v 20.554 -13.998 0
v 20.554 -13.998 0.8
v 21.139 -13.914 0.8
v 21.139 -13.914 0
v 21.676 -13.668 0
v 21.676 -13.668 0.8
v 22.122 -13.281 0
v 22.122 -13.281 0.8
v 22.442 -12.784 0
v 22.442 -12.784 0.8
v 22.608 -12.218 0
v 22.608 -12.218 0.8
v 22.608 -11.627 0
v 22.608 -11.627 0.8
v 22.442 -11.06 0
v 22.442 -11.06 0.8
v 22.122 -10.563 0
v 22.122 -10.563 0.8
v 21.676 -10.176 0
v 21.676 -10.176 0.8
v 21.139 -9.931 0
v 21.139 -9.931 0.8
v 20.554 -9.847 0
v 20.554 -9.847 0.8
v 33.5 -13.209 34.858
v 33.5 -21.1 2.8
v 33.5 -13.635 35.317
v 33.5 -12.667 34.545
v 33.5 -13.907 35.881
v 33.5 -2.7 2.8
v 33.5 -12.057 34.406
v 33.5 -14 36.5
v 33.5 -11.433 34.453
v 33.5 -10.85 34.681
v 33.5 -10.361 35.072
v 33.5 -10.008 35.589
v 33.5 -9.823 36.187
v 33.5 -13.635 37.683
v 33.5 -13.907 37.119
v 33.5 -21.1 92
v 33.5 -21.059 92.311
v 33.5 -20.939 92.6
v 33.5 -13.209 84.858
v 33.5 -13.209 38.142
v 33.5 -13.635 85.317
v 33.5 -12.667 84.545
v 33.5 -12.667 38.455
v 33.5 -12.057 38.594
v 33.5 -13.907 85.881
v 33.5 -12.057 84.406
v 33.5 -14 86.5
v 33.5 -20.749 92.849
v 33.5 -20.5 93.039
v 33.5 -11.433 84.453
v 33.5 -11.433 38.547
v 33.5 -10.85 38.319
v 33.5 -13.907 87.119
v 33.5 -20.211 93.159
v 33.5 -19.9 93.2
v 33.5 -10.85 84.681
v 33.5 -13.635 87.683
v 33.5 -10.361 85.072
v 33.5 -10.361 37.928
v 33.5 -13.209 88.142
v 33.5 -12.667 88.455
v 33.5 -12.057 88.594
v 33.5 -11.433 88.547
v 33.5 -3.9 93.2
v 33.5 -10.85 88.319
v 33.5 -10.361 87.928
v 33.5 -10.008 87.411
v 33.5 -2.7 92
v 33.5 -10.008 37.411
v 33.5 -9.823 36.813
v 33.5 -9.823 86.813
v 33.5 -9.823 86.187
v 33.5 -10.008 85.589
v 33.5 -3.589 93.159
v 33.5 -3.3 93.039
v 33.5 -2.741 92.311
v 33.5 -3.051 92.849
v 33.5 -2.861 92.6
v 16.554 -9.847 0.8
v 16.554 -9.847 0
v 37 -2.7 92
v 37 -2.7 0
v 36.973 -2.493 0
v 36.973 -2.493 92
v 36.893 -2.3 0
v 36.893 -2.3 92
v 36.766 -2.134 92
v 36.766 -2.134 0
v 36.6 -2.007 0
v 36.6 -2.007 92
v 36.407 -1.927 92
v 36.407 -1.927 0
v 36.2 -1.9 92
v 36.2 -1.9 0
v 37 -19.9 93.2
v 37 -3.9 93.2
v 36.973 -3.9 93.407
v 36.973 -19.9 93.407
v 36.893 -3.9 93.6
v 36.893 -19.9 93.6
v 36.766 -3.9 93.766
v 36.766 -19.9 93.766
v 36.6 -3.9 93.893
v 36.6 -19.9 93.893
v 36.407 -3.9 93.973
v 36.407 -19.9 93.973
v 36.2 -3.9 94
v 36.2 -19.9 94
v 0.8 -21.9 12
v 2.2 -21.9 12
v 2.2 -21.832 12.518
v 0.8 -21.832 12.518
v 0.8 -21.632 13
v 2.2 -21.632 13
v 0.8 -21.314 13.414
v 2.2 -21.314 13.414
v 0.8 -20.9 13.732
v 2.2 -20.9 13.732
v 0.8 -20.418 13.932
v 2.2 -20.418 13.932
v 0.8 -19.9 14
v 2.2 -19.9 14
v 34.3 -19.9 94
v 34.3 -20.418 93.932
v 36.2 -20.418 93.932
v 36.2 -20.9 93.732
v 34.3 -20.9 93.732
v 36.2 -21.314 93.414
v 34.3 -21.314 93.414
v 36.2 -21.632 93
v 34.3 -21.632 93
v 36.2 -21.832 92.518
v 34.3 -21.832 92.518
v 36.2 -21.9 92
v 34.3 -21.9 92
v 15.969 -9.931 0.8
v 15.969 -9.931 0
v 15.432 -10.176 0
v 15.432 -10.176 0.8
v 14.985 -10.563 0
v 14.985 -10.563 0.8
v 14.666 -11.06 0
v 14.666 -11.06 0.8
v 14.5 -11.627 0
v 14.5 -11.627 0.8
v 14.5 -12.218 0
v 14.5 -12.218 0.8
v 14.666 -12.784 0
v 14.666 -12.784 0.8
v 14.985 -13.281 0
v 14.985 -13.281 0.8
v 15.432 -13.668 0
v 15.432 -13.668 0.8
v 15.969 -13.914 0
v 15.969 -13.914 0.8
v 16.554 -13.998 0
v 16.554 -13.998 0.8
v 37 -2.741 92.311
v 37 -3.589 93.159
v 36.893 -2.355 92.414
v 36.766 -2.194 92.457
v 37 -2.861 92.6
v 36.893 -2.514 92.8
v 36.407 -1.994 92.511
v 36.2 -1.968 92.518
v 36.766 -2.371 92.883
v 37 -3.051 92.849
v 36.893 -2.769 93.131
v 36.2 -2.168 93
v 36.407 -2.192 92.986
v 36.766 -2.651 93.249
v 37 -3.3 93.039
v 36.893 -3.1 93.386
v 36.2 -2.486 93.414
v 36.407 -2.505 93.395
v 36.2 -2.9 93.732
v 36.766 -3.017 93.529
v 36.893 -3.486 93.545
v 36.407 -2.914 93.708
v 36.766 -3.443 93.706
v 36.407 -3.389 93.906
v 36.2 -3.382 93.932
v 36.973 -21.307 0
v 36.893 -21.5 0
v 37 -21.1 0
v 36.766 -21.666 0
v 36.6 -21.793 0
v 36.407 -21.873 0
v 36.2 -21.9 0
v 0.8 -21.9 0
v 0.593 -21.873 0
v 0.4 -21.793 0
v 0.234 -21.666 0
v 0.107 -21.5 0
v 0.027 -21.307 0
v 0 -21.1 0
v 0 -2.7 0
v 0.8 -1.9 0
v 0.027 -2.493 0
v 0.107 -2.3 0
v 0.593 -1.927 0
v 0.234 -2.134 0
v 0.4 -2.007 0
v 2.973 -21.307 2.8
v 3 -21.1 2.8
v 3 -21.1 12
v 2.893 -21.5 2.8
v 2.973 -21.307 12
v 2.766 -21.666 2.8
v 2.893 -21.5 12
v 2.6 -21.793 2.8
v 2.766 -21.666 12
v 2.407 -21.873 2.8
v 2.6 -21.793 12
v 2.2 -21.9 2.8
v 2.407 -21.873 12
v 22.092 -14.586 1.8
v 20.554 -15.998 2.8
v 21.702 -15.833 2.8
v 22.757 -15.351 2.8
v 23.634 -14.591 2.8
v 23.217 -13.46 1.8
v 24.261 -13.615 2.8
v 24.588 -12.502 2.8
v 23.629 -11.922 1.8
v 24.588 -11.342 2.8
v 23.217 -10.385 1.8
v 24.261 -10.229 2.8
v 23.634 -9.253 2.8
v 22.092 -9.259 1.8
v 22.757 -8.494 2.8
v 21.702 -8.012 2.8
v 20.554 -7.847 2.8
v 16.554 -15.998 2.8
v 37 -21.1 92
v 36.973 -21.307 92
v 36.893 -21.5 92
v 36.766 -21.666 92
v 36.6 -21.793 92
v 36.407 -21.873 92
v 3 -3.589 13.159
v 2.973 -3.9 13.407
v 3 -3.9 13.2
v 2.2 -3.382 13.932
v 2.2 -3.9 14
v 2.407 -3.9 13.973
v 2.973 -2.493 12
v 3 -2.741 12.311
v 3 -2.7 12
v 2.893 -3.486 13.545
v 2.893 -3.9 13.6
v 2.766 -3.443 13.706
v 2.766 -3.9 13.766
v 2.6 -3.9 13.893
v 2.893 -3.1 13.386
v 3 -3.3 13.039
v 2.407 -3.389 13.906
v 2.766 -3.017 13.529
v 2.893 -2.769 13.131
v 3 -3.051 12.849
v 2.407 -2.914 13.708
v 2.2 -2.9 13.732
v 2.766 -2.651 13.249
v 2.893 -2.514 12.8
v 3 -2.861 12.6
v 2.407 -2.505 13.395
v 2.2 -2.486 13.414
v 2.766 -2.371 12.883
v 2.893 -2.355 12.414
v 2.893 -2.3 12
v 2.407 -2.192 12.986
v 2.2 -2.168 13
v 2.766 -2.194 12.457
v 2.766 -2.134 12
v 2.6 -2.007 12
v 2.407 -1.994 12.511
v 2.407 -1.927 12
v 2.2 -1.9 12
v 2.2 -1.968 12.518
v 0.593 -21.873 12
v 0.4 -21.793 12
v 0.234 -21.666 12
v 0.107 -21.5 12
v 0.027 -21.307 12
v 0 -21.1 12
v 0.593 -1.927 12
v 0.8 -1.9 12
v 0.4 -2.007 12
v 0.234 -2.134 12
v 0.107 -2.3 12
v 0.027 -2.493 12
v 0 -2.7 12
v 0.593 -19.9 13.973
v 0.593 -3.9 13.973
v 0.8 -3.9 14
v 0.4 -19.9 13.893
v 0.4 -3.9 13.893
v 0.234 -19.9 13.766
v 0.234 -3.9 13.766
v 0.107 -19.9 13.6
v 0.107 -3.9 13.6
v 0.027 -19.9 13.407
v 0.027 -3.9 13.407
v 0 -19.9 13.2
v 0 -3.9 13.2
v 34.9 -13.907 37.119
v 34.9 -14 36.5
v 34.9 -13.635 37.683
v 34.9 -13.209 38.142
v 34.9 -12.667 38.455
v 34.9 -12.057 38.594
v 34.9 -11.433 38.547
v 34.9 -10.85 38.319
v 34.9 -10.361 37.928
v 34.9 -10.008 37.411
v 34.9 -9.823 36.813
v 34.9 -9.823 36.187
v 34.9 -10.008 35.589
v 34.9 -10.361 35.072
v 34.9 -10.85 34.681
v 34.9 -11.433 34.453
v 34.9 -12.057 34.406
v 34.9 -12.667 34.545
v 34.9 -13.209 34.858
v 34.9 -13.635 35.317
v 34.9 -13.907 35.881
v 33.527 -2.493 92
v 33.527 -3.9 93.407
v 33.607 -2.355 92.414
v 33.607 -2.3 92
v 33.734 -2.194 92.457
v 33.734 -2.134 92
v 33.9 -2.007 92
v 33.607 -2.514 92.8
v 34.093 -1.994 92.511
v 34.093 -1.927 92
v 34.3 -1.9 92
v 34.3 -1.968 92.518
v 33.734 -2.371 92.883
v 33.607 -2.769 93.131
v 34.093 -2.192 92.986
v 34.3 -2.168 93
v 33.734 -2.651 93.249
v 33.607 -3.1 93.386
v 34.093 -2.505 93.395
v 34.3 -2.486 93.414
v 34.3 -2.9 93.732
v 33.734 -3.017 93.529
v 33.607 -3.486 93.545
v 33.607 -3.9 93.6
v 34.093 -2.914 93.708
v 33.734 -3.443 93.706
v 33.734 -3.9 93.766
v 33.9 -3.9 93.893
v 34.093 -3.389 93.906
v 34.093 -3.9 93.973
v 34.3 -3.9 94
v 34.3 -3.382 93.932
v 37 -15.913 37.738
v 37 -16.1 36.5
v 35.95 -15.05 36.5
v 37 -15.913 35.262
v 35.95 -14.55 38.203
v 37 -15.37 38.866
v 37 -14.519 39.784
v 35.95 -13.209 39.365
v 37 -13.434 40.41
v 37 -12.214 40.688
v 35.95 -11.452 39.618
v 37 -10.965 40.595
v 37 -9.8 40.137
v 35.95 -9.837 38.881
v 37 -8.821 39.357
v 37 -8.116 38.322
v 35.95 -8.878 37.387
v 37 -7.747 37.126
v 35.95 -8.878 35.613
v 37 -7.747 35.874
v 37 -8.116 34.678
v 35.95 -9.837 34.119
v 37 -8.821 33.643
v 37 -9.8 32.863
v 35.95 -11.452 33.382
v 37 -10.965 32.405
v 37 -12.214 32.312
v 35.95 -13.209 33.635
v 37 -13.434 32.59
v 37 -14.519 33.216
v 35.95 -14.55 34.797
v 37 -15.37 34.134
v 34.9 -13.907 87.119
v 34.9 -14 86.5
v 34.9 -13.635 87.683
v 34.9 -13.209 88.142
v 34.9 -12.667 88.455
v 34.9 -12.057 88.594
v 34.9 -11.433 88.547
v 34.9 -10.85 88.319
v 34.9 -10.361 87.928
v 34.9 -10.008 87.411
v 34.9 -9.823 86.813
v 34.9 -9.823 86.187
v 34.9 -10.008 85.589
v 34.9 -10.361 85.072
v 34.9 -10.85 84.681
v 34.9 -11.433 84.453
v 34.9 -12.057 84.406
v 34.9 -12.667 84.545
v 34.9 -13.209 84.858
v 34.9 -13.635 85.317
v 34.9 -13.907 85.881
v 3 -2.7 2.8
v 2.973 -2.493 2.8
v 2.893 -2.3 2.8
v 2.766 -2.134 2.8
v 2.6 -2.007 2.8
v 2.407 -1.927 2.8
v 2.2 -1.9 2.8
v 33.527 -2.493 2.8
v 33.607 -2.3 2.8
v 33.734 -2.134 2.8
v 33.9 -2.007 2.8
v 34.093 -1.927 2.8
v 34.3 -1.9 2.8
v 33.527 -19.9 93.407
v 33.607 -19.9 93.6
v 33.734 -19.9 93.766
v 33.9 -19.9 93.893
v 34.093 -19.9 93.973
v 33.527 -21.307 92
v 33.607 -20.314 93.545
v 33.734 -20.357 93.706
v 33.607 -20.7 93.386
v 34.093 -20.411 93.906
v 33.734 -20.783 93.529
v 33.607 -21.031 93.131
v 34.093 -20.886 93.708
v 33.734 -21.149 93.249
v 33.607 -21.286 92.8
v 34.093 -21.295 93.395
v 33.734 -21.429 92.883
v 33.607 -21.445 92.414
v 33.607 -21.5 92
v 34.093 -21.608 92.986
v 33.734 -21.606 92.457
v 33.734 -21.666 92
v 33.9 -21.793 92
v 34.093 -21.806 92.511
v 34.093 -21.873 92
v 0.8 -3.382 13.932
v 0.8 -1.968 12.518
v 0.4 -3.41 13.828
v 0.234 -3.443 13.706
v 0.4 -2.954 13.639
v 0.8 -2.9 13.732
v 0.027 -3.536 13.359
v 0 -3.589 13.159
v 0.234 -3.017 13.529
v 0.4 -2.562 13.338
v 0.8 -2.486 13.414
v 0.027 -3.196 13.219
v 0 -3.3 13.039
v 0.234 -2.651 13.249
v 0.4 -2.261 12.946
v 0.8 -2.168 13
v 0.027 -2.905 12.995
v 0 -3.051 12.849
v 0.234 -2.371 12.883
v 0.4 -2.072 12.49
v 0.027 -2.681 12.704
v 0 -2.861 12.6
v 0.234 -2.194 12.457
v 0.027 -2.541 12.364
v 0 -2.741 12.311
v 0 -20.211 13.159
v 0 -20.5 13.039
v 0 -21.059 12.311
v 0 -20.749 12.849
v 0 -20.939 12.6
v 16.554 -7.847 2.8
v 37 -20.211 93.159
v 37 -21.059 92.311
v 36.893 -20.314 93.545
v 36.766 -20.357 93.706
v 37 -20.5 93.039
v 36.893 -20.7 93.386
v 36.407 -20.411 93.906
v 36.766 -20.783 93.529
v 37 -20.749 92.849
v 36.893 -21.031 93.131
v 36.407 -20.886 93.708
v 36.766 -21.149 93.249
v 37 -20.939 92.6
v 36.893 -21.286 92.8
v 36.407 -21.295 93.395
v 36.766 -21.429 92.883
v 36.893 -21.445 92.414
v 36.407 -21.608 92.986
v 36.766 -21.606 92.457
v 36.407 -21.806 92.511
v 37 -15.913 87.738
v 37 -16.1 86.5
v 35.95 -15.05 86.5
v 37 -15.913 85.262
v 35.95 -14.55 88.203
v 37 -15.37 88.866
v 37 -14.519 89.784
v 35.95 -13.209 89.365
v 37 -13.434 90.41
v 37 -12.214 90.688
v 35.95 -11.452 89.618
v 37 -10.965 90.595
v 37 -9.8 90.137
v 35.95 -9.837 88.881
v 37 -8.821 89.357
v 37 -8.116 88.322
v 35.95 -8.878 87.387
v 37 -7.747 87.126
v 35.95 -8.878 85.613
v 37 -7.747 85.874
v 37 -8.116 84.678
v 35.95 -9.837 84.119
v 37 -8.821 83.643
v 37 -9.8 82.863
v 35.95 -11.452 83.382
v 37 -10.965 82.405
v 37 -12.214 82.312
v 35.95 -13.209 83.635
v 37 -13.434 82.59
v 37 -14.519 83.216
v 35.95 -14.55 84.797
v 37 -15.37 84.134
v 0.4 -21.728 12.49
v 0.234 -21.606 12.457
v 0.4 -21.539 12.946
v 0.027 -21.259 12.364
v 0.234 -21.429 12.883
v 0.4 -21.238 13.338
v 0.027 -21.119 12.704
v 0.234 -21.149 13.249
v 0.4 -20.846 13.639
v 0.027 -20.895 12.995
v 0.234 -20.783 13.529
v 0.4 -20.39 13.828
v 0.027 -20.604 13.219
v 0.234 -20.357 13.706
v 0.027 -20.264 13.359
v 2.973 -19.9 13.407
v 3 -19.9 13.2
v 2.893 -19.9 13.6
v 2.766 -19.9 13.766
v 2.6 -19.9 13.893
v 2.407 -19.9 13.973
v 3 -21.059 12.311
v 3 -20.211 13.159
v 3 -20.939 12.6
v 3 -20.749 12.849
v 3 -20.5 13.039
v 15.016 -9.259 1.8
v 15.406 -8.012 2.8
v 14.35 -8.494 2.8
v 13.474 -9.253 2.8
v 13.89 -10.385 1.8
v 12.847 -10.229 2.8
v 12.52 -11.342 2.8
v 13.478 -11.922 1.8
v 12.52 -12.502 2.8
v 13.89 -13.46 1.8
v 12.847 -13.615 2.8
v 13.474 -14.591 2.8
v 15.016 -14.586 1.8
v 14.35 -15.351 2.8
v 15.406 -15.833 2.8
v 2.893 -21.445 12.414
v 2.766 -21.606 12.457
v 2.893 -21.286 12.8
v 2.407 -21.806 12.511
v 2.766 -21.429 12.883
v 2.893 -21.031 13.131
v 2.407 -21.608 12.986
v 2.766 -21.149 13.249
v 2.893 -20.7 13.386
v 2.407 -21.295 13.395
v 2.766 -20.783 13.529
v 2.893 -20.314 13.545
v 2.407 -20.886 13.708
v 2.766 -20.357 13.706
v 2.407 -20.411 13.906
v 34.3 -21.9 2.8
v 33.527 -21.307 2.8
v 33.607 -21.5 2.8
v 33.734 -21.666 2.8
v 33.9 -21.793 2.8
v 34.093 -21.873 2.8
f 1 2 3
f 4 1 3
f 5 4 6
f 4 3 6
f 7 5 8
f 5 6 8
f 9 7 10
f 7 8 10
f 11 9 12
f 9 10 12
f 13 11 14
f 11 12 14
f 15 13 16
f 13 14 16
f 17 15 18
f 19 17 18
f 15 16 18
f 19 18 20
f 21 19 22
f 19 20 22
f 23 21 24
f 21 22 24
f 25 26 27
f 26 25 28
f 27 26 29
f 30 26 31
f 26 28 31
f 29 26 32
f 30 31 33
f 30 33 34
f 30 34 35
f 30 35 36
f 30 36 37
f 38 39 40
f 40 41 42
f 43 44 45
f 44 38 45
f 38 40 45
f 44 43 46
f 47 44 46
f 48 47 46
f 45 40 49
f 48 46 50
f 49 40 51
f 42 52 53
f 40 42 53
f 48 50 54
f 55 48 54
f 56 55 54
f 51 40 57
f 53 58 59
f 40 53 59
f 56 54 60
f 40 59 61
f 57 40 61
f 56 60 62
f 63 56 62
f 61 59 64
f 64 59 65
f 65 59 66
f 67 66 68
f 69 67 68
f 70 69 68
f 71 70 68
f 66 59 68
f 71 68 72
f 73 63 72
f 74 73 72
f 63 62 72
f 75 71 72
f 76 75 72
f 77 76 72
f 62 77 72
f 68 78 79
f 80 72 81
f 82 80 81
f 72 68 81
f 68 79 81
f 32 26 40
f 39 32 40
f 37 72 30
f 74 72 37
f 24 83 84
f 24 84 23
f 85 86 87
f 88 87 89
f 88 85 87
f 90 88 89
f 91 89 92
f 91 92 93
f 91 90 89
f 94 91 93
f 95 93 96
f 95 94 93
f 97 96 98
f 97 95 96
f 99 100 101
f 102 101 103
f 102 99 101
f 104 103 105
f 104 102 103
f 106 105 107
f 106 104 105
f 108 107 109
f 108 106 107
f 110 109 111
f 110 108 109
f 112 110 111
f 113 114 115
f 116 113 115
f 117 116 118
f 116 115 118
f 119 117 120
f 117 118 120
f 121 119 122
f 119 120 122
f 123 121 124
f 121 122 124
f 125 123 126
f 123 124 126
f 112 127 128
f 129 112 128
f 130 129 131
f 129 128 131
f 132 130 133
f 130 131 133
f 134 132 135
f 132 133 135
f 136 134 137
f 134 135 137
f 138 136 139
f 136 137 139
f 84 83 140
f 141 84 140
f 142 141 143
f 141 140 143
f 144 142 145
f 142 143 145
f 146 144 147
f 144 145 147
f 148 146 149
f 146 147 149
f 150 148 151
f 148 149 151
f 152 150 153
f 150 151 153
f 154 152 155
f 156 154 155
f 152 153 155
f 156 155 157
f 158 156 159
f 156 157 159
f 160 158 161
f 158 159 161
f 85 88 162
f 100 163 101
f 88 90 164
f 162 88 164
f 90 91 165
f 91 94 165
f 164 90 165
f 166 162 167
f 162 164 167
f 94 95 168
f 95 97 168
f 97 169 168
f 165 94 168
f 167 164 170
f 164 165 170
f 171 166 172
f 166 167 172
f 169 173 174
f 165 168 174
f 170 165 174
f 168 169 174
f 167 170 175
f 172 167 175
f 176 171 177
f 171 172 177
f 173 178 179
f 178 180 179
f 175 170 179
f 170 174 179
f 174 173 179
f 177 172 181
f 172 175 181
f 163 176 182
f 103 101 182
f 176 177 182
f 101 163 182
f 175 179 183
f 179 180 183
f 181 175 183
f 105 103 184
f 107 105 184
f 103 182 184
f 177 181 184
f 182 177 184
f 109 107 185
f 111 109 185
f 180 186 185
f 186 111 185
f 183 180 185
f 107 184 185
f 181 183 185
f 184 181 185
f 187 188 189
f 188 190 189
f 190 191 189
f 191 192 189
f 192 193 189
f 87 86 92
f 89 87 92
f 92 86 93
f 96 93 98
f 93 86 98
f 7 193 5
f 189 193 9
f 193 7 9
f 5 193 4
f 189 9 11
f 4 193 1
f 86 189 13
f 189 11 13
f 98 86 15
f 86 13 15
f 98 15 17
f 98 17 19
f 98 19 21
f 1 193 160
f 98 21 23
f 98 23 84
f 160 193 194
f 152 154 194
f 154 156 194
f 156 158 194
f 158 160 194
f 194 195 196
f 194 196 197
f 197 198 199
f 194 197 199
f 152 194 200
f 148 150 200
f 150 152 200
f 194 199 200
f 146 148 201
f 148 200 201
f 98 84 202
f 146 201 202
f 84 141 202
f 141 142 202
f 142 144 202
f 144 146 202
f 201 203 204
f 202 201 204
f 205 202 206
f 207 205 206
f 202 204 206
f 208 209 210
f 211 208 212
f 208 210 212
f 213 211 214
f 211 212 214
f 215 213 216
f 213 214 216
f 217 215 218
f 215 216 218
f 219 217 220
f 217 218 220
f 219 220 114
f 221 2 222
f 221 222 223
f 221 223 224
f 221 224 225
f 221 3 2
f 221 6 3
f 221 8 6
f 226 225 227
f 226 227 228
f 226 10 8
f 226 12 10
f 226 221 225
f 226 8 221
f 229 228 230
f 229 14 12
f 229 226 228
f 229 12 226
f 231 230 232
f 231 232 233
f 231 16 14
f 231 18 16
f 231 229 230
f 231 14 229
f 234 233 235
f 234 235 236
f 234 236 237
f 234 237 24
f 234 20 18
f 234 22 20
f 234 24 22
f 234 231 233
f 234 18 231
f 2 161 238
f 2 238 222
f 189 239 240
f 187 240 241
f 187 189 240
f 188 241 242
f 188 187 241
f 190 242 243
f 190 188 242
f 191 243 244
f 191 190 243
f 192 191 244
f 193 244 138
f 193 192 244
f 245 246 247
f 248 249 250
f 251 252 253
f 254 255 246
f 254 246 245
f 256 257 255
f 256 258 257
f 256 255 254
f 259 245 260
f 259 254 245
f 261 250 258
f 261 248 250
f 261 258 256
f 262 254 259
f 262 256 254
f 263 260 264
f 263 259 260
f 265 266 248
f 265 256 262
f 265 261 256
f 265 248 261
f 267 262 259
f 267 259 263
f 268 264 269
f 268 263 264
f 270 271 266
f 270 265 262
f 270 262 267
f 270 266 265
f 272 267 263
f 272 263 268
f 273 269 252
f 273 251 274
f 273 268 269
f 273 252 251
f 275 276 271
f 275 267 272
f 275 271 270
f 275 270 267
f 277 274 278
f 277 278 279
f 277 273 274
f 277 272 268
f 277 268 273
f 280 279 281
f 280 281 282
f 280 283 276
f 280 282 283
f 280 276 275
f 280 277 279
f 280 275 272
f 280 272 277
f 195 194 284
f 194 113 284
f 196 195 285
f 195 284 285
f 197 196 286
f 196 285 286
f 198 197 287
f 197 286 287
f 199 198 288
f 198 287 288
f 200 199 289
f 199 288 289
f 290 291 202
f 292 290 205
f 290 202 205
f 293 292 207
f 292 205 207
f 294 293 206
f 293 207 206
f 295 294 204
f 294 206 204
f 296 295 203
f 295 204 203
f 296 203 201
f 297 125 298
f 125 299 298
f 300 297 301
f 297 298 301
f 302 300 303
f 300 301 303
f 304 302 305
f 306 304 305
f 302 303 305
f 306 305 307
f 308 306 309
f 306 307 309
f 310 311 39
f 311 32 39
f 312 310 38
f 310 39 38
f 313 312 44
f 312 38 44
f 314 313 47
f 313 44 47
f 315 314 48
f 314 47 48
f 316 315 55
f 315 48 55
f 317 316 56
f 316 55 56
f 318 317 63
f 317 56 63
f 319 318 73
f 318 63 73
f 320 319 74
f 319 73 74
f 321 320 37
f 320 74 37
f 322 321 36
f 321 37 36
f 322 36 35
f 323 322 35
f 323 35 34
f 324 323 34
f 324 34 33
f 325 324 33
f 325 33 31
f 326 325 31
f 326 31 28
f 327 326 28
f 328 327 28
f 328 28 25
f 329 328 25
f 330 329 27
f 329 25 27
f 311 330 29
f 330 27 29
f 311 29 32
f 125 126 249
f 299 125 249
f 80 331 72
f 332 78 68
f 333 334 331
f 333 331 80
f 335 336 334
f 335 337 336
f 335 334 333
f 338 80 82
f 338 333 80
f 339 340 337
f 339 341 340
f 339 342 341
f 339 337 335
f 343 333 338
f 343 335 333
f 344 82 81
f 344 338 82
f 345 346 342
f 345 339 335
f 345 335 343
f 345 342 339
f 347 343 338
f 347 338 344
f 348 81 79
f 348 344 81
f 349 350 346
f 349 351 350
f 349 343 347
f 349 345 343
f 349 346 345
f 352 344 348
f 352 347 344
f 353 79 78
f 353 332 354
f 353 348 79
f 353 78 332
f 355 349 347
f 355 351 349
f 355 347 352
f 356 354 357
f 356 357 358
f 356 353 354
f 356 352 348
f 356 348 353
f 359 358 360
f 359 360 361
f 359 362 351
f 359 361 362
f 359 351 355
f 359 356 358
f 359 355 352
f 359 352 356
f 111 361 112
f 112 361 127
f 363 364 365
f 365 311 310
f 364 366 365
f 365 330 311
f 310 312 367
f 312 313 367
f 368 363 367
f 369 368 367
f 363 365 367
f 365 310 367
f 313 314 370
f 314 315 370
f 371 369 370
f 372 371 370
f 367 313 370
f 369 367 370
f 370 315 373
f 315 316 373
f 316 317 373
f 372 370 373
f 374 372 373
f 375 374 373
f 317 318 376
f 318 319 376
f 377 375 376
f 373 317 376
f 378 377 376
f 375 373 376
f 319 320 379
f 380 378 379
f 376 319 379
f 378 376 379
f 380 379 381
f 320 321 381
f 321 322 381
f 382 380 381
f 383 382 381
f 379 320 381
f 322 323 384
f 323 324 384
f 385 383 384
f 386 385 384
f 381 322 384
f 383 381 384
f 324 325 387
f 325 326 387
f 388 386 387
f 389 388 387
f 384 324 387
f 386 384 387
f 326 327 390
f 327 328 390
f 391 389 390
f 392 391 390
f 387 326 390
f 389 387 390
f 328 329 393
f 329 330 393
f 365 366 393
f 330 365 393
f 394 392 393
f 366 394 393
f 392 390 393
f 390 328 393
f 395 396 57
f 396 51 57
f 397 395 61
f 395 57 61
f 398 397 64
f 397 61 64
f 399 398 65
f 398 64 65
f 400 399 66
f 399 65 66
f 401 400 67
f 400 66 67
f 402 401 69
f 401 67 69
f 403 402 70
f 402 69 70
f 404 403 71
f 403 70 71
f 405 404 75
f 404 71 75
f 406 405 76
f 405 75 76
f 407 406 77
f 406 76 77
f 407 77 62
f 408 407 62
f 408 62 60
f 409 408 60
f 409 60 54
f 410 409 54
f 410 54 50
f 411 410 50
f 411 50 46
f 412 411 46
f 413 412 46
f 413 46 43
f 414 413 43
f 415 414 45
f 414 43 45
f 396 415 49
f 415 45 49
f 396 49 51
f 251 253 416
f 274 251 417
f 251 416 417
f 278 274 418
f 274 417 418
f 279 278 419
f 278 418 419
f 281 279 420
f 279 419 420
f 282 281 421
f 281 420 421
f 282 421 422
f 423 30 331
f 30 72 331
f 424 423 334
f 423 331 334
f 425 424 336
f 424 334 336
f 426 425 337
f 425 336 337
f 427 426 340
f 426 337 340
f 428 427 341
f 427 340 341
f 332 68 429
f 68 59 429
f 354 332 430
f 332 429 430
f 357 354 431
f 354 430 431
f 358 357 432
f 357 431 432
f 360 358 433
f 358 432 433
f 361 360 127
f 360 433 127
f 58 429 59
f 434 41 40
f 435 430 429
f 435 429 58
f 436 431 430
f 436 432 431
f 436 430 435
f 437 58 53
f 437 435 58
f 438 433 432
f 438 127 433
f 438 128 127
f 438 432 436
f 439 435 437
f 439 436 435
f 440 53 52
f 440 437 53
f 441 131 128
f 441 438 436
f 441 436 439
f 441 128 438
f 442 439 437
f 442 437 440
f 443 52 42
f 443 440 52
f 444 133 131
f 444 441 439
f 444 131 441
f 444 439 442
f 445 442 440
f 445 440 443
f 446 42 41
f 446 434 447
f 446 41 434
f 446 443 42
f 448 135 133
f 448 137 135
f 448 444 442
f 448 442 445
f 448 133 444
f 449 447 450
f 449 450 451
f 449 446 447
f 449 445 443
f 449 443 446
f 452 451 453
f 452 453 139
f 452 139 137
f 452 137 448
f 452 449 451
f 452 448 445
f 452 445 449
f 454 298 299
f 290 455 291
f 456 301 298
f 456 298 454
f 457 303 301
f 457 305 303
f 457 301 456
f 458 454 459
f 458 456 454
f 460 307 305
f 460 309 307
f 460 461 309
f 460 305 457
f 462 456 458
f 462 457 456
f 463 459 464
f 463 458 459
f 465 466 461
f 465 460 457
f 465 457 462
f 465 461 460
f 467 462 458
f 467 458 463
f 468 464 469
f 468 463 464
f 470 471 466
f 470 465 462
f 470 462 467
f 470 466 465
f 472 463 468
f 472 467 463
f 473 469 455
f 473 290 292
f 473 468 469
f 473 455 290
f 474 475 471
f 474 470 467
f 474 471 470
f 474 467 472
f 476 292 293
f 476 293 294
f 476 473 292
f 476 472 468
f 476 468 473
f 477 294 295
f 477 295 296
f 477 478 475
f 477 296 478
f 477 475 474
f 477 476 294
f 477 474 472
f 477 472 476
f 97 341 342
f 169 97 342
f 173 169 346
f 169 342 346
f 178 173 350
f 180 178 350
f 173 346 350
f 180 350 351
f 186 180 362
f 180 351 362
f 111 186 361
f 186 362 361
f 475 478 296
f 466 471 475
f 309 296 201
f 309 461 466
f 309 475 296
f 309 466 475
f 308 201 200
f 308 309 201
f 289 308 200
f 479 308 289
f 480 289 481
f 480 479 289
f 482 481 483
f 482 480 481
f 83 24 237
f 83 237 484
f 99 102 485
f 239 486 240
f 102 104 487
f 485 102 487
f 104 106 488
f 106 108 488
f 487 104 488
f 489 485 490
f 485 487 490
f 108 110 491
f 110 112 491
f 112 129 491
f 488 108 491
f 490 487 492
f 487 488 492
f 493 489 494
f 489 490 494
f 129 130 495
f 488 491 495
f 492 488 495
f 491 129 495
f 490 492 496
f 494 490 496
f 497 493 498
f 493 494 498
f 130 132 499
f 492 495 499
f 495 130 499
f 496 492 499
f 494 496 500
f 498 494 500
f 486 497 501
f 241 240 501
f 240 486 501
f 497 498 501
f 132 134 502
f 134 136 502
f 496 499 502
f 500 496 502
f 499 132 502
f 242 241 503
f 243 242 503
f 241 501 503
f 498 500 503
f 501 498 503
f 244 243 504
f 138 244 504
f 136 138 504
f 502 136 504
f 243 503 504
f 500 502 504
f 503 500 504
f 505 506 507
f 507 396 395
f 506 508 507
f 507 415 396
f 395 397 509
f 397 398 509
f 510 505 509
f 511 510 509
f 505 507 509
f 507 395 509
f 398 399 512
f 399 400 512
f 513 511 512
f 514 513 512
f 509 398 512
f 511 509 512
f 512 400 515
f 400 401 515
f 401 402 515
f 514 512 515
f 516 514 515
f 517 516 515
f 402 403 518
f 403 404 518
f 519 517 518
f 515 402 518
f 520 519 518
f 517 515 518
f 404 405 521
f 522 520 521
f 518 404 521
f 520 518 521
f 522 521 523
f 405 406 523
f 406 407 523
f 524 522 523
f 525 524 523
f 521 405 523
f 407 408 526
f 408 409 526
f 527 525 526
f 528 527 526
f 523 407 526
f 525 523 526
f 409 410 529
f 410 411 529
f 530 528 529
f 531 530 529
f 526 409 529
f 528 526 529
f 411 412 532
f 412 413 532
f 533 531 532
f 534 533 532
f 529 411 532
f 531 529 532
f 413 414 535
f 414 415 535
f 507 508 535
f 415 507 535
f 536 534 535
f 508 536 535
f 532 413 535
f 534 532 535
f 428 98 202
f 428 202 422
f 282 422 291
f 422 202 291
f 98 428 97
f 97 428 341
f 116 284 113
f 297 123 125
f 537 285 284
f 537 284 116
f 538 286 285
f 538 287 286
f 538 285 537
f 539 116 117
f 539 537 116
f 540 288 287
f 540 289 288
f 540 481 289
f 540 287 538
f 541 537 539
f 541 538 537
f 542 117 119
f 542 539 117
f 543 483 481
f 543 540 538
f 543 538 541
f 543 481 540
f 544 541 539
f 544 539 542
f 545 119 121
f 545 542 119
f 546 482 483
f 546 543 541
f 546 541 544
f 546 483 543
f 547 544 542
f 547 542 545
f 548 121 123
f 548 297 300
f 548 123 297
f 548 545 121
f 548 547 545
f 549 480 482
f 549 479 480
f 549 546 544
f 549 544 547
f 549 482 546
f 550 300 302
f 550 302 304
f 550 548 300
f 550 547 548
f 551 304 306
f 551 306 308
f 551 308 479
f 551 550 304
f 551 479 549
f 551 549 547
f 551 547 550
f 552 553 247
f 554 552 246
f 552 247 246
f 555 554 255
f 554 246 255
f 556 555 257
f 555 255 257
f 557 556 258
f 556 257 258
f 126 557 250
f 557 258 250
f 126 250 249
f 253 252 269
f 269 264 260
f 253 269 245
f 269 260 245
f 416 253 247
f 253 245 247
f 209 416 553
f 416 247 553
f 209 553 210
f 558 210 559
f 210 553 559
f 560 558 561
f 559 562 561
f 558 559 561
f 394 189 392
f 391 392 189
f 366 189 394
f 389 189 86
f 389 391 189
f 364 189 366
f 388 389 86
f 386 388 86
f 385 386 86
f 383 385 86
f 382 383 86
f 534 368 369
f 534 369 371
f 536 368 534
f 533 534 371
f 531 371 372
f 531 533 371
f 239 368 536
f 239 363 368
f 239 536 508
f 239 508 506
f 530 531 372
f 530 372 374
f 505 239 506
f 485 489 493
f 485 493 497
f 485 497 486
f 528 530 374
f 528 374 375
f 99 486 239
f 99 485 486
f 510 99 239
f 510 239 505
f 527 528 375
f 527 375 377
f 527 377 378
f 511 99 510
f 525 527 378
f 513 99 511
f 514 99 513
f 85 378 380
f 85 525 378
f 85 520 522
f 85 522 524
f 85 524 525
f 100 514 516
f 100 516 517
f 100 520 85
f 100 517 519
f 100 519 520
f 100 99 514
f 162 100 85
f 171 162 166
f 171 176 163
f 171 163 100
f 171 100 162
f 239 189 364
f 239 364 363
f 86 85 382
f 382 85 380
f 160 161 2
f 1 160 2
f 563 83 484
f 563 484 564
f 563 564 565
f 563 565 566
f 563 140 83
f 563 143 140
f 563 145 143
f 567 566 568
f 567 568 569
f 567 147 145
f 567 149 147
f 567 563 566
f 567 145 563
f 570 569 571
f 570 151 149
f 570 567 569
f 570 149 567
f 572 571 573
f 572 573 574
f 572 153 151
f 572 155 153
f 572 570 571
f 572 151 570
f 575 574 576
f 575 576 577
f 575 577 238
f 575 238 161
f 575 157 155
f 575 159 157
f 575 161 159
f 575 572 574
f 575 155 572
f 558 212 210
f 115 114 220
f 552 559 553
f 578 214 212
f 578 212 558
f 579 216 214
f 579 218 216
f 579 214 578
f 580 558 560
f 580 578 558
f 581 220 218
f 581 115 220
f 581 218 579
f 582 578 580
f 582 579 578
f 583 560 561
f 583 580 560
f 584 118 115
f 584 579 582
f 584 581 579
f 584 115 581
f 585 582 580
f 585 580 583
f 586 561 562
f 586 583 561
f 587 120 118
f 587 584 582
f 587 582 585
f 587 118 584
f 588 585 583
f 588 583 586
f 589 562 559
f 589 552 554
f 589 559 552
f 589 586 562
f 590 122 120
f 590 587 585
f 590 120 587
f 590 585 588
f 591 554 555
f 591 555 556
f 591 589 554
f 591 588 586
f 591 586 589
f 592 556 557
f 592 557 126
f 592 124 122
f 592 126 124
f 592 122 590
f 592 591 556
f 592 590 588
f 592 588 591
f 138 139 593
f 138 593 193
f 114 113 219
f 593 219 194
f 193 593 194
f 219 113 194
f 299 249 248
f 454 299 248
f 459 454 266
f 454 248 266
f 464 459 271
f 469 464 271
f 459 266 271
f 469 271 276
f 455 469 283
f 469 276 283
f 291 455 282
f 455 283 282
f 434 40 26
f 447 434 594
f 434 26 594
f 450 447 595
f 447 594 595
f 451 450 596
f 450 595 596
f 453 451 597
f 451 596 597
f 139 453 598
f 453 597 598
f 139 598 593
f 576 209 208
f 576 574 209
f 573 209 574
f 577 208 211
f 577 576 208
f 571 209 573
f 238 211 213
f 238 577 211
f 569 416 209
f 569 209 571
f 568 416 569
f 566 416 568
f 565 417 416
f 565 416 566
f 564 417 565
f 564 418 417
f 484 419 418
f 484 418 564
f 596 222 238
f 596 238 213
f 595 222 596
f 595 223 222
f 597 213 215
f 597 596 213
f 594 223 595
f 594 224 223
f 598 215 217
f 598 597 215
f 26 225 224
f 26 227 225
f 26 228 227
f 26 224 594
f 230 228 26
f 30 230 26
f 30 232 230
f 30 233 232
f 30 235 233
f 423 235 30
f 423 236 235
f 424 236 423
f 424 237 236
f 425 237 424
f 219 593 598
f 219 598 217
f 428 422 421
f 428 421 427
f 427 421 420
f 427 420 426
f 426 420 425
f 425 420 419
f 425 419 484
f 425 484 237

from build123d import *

# Parameters (mm, degrees)
SKETCH018_W         = 30.5
SKETCH018_H         = 20
PAD010_DEPTH        = 2.8
PAD011_DEPTH        = 3
PAD012_DEPTH        = 3.5
HOLE005_D           = 4.2
HOLE005_DEPTH       = 25
HOLE005_CSINK_D     = 8.4
HOLE005_CSINK_ANGLE = 90
HOLE005_TIPS_R      = 2.1
POCKET003_DEPTH     = 2.801
CHAMFER001_SIZE     = 2
FILLET001_R         = 0.8


with BuildPart() as part:
    # Sketch018 → Pad010 (new body)
    with BuildSketch(Plane.XY):
        with Locations((18.25, 10)):
            Rectangle(SKETCH018_W, SKETCH018_H)
    extrude(amount=PAD010_DEPTH)

    # Sketch019 (on Face4 of Pad010) → Pad011 (join)
    with BuildSketch(Plane(origin=(3, 0, 0), x_dir=(0, -1, 0), z_dir=(-1, 0, 0))):
        with BuildLine():
            Line((-20, 0), (0, 0))
            Line((0, 0), (0, 12))
            ThreePointArc((0, 12), (-0.585786, 13.414214), (-2, 14))
            Line((-2, 14), (-18, 14))
            ThreePointArc((-18, 14), (-19.414214, 13.414214), (-20, 12))
            Line((-20, 12), (-20, 0))
        make_face()
    extrude(amount=PAD011_DEPTH)

    # Sketch020 (on Face1 of Pad011) → Pad012 (join)
    with BuildSketch(Plane.YZ.offset(33.5)):
        with BuildLine():
            Line((20, 0), (20, 92))
            ThreePointArc((20, 92), (19.414214, 93.414214), (18, 94))
            Line((18, 94), (2, 94))
            ThreePointArc((2, 94), (0.585786, 93.414214), (0, 92))
            Line((0, 92), (0, 0))
            Line((0, 0), (20, 0))
        make_face()
    extrude(amount=PAD012_DEPTH)

    # Hole005
    with Locations(Plane.YZ.offset(37)):
        with Locations((10, 36.5), (10, 86.5)):
            CounterSinkHole(HOLE005_D / 2, HOLE005_CSINK_D / 2, depth=HOLE005_DEPTH, counter_sink_angle=HOLE005_CSINK_ANGLE)

    # Hole005 tips → Hole005 tip 1 section 0
    with BuildSketch(Plane.YZ.offset(12), mode=Mode.PRIVATE) as hole005_tip_1_s0:
        with Locations((10, 36.5)):
            Circle(HOLE005_TIPS_R)
    loft([hole005_tip_1_s0.sketch, Vertex(10.738193, 10, 36.5)], mode=Mode.SUBTRACT)

    # Hole005 tips → Hole005 tip 2 section 0
    with BuildSketch(Plane.YZ.offset(12), mode=Mode.PRIVATE) as hole005_tip_2_s0:
        with Locations((10, 86.5)):
            Circle(HOLE005_TIPS_R)
    loft([hole005_tip_2_s0.sketch, Vertex(10.738193, 10, 86.5)], mode=Mode.SUBTRACT)

    # Sketch022 (on Face1 of Hole005) → Pocket003 (cut, through all)
    with BuildSketch(Plane.XY.offset(2.8)):
        with BuildLine():
            ThreePointArc((16.553834, 12.053193), (14.478422, 9.977781), (16.553834, 7.902369))
            Line((16.553834, 7.902369), (20.553834, 7.902369))
            ThreePointArc((20.553834, 7.902369), (22.629246, 9.977781), (20.553834, 12.053193))
            Line((16.553834, 12.053193), (20.553834, 12.053193))
        make_face()
    extrude(amount=-POCKET003_DEPTH, mode=Mode.SUBTRACT)

    # Chamfer001
    chamfer001_edges = [part.edges().sort_by_distance(p)[0] for p in [
        (18.553834, 7.902369, 2.8),
    ]]
    chamfer(chamfer001_edges, length=CHAMFER001_SIZE)

    # Fillet001
    fillet001_edges = [part.edges().sort_by_distance(p)[0] for p in [
        (0, 10, 14),
        (3, 10, 14),
        (33.5, 10, 94),
        (37, 10, 94),
    ]]
    fillet(fillet001_edges, radius=FILLET001_R)


with BuildPart() as part_1:
    # Body004 placement: moved
    add(part.part.moved(Location((0, -21.9, 0))))


solid = part_1.part
